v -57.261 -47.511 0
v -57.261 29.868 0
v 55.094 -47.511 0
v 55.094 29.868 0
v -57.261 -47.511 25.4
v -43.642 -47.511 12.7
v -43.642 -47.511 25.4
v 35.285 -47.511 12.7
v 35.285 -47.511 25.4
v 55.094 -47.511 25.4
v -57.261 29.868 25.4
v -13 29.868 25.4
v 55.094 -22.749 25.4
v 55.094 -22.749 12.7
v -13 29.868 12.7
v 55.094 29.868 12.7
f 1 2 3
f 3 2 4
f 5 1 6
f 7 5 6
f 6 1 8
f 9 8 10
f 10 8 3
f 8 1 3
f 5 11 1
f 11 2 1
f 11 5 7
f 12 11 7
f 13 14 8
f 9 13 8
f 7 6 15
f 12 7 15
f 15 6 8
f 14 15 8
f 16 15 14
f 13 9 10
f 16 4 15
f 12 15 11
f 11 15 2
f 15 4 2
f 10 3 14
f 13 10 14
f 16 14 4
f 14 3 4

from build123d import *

# Parameters (mm, degrees)
F1_DEPTH = 12.7
F3_DEPTH = 12.7
F5_DEPTH = 12.7


with BuildPart() as f1:
    # F0 (on Top) → F1 (new body)
    with BuildSketch(Plane.XY):
        Polygon((-57.260543, -47.510773), (-37.141975, -47.510773), (55.093925, -47.510773), (55.093925, 29.868338), (-57.260543, 29.868338), align=None)
    extrude(amount=F1_DEPTH)

    # F2 (on face) → F3 (join)
    with BuildSketch(Plane.XY.offset(12.7)):
        Polygon((-43.641821, -47.510773), (-12.99969, 29.868338), (-57.260543, 29.868338), (-57.260543, -47.510773), align=None)
    extrude(amount=F3_DEPTH)

    # F4 (on face) → F5 (join)
    with BuildSketch(Plane.XY.offset(12.7)):
        Polygon((55.093925, -22.749459), (35.284877, -47.510773), (55.093925, -47.510773), align=None)
    extrude(amount=F5_DEPTH)


solid = f1.part
